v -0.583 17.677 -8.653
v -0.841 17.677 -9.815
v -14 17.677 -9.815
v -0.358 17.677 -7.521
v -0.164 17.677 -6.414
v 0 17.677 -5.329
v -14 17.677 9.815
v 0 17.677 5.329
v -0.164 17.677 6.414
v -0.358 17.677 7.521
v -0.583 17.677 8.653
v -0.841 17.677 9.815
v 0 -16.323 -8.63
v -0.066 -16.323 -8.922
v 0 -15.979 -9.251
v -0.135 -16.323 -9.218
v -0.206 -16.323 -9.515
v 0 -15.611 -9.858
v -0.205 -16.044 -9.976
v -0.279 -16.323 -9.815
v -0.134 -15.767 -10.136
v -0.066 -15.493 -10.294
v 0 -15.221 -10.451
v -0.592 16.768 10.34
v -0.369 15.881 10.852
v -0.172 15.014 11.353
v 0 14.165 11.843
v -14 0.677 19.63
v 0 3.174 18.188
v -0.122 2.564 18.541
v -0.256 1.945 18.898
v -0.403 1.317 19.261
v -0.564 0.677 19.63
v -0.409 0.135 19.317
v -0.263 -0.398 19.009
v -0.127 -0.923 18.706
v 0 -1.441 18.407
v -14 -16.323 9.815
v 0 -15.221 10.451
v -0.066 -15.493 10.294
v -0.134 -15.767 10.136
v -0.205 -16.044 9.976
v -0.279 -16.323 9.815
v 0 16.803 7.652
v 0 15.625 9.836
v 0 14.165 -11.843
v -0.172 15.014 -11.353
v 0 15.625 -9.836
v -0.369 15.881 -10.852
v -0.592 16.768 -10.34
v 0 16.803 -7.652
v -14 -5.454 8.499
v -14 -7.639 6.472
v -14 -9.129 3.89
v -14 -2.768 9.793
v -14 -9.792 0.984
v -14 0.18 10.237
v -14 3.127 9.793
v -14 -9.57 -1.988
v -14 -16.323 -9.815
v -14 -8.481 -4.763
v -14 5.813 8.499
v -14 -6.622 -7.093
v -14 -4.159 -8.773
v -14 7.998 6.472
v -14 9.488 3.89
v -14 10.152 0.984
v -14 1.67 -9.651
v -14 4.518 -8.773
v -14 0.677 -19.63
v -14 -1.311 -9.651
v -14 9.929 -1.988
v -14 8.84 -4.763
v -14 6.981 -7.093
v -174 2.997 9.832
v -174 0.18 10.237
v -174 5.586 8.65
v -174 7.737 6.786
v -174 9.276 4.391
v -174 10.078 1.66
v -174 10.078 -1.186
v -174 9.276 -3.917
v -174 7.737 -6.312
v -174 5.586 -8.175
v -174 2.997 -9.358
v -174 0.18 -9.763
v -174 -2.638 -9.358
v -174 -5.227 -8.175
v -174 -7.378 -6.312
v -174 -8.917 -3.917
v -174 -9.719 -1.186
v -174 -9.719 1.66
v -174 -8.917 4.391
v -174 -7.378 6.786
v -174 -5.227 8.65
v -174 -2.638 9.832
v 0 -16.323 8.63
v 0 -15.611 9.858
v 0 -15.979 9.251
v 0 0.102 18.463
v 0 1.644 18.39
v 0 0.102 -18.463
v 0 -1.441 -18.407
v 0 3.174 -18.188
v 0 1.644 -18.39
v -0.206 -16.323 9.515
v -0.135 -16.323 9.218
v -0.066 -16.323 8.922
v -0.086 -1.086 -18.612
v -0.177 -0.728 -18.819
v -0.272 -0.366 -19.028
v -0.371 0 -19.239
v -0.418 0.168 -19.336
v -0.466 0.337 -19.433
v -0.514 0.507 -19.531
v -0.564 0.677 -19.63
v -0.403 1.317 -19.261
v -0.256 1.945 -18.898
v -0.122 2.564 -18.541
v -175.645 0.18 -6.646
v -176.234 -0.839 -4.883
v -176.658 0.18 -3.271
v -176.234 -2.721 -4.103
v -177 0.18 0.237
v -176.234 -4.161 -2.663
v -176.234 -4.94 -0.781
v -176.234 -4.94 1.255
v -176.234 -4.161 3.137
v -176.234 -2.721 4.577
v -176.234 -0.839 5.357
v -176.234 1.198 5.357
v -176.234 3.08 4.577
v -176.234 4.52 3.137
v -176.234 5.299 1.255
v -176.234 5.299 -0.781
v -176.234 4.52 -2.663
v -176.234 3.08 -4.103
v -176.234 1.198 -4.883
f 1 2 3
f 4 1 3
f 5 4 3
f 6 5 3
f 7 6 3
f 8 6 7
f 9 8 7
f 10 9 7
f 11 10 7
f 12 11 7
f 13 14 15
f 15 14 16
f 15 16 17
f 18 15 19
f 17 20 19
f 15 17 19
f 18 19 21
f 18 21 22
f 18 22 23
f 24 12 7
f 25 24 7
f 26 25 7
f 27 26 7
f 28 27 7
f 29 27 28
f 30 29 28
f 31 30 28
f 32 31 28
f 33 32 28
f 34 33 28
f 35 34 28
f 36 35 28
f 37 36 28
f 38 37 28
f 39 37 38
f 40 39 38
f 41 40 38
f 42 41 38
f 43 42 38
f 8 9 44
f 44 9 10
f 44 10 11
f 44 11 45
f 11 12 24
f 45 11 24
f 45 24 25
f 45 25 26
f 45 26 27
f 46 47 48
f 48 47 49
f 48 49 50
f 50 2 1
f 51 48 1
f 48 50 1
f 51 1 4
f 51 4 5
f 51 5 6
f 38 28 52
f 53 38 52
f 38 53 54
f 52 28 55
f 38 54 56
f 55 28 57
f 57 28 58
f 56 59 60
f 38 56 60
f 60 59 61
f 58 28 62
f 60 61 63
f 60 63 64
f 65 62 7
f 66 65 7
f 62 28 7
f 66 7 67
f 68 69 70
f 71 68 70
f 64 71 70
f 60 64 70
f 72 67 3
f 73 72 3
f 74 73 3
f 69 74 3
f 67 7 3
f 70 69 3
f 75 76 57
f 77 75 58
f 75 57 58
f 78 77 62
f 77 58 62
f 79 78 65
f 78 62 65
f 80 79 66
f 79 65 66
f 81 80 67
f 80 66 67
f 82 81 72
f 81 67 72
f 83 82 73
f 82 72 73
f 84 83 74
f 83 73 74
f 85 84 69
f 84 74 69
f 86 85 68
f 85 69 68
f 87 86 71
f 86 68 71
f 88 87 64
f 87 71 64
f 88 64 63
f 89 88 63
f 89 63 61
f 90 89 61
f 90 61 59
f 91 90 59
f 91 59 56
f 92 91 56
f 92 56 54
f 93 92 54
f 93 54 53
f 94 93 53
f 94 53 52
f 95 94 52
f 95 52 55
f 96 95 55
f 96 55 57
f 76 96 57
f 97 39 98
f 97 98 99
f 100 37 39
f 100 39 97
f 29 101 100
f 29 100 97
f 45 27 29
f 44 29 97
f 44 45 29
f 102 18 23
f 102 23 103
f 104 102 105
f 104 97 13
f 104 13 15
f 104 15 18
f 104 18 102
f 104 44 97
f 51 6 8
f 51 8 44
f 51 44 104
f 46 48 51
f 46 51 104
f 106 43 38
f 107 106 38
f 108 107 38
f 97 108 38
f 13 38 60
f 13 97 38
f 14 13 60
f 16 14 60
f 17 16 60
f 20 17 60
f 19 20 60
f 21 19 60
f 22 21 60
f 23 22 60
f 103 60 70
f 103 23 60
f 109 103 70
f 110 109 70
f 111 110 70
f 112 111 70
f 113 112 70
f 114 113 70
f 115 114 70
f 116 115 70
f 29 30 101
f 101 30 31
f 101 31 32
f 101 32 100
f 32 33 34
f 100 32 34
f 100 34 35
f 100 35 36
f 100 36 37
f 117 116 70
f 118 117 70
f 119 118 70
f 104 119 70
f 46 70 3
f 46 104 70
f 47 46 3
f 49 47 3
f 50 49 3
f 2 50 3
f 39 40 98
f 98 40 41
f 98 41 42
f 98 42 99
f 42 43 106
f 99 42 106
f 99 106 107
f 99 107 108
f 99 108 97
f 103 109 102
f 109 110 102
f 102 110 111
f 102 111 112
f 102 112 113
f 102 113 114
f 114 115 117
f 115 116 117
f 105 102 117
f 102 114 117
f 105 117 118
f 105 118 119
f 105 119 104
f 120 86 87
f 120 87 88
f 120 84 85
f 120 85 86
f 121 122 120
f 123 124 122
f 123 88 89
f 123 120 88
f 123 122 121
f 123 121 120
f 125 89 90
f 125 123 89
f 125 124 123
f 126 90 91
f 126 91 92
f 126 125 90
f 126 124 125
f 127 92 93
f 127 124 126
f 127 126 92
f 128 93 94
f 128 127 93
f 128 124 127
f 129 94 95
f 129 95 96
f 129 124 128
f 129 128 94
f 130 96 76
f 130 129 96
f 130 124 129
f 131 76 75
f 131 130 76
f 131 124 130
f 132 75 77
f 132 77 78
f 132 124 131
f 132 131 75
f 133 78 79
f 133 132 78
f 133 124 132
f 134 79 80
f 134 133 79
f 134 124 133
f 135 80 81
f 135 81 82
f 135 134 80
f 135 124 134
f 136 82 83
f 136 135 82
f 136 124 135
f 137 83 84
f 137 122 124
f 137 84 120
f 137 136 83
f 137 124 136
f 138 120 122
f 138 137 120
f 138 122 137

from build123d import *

# Parameters (mm, degrees)
BOSS_EXTRUDE1_DEPTH = 14
SKETCH2_R           = 10
BOSS_EXTRUDE2_DEPTH = 160
DOME1_FACE_RADIUS   = 10
DOME1_HEIGHT        = 3


with BuildPart() as part:
    # Sketch1 → Boss-Extrude1 (new body)
    with BuildSketch(Plane(origin=(0, 0, 0), x_dir=(0, 0, -1), z_dir=(1, 0, 0))):
        Polygon((19.629909152, 0.677446241), (9.814954576, 17.677446241), (-9.814954576, 17.677446241), (-19.629909152, 0.677446241), (-9.814954576, -16.322553759), (9.814954576, -16.322553759), align=None)
    extrude(amount=-BOSS_EXTRUDE1_DEPTH)

    # Sketch2 → Boss-Extrude2 (add)
    with BuildSketch(Plane.ZY.offset(14)):
        with Locations((0.23707655, 0.179585486)):
            Circle(SKETCH2_R)
    extrude(amount=BOSS_EXTRUDE2_DEPTH)

    # Dome1: a dome of height H over a round flat face of radius A is a cap of a sphere of radius (A * A + H * H) / (2 * H)
    dome1_r = (DOME1_FACE_RADIUS * DOME1_FACE_RADIUS + DOME1_HEIGHT * DOME1_HEIGHT) / (2 * DOME1_HEIGHT)
    dome1_base = Plane((-174, 0.179585486, 0.23707655), z_dir=(-1, 0, 0))
    with Locations(dome1_base.offset(DOME1_HEIGHT - dome1_r)):
        dome1_ball = Sphere(dome1_r, mode=Mode.PRIVATE)
    add(split(dome1_ball, bisect_by=dome1_base, keep=Keep.TOP, mode=Mode.PRIVATE))

    # Sketch4 → Cut-Revolve4 (revolve, cut)
    with BuildSketch(Plane(origin=(0, 0, 0), x_dir=(1, 0, 0), z_dir=(0, 1, 0))):
        Polygon((0, 18.463333515), (-1.632693956, 21.873968697), (3.881125963, 21.268551199), (2.875714826, 18.463333515), align=None)
    revolve(axis=Axis((0, 0, 0), (1, 0, 0)), mode=Mode.SUBTRACT)


solid = part.part
